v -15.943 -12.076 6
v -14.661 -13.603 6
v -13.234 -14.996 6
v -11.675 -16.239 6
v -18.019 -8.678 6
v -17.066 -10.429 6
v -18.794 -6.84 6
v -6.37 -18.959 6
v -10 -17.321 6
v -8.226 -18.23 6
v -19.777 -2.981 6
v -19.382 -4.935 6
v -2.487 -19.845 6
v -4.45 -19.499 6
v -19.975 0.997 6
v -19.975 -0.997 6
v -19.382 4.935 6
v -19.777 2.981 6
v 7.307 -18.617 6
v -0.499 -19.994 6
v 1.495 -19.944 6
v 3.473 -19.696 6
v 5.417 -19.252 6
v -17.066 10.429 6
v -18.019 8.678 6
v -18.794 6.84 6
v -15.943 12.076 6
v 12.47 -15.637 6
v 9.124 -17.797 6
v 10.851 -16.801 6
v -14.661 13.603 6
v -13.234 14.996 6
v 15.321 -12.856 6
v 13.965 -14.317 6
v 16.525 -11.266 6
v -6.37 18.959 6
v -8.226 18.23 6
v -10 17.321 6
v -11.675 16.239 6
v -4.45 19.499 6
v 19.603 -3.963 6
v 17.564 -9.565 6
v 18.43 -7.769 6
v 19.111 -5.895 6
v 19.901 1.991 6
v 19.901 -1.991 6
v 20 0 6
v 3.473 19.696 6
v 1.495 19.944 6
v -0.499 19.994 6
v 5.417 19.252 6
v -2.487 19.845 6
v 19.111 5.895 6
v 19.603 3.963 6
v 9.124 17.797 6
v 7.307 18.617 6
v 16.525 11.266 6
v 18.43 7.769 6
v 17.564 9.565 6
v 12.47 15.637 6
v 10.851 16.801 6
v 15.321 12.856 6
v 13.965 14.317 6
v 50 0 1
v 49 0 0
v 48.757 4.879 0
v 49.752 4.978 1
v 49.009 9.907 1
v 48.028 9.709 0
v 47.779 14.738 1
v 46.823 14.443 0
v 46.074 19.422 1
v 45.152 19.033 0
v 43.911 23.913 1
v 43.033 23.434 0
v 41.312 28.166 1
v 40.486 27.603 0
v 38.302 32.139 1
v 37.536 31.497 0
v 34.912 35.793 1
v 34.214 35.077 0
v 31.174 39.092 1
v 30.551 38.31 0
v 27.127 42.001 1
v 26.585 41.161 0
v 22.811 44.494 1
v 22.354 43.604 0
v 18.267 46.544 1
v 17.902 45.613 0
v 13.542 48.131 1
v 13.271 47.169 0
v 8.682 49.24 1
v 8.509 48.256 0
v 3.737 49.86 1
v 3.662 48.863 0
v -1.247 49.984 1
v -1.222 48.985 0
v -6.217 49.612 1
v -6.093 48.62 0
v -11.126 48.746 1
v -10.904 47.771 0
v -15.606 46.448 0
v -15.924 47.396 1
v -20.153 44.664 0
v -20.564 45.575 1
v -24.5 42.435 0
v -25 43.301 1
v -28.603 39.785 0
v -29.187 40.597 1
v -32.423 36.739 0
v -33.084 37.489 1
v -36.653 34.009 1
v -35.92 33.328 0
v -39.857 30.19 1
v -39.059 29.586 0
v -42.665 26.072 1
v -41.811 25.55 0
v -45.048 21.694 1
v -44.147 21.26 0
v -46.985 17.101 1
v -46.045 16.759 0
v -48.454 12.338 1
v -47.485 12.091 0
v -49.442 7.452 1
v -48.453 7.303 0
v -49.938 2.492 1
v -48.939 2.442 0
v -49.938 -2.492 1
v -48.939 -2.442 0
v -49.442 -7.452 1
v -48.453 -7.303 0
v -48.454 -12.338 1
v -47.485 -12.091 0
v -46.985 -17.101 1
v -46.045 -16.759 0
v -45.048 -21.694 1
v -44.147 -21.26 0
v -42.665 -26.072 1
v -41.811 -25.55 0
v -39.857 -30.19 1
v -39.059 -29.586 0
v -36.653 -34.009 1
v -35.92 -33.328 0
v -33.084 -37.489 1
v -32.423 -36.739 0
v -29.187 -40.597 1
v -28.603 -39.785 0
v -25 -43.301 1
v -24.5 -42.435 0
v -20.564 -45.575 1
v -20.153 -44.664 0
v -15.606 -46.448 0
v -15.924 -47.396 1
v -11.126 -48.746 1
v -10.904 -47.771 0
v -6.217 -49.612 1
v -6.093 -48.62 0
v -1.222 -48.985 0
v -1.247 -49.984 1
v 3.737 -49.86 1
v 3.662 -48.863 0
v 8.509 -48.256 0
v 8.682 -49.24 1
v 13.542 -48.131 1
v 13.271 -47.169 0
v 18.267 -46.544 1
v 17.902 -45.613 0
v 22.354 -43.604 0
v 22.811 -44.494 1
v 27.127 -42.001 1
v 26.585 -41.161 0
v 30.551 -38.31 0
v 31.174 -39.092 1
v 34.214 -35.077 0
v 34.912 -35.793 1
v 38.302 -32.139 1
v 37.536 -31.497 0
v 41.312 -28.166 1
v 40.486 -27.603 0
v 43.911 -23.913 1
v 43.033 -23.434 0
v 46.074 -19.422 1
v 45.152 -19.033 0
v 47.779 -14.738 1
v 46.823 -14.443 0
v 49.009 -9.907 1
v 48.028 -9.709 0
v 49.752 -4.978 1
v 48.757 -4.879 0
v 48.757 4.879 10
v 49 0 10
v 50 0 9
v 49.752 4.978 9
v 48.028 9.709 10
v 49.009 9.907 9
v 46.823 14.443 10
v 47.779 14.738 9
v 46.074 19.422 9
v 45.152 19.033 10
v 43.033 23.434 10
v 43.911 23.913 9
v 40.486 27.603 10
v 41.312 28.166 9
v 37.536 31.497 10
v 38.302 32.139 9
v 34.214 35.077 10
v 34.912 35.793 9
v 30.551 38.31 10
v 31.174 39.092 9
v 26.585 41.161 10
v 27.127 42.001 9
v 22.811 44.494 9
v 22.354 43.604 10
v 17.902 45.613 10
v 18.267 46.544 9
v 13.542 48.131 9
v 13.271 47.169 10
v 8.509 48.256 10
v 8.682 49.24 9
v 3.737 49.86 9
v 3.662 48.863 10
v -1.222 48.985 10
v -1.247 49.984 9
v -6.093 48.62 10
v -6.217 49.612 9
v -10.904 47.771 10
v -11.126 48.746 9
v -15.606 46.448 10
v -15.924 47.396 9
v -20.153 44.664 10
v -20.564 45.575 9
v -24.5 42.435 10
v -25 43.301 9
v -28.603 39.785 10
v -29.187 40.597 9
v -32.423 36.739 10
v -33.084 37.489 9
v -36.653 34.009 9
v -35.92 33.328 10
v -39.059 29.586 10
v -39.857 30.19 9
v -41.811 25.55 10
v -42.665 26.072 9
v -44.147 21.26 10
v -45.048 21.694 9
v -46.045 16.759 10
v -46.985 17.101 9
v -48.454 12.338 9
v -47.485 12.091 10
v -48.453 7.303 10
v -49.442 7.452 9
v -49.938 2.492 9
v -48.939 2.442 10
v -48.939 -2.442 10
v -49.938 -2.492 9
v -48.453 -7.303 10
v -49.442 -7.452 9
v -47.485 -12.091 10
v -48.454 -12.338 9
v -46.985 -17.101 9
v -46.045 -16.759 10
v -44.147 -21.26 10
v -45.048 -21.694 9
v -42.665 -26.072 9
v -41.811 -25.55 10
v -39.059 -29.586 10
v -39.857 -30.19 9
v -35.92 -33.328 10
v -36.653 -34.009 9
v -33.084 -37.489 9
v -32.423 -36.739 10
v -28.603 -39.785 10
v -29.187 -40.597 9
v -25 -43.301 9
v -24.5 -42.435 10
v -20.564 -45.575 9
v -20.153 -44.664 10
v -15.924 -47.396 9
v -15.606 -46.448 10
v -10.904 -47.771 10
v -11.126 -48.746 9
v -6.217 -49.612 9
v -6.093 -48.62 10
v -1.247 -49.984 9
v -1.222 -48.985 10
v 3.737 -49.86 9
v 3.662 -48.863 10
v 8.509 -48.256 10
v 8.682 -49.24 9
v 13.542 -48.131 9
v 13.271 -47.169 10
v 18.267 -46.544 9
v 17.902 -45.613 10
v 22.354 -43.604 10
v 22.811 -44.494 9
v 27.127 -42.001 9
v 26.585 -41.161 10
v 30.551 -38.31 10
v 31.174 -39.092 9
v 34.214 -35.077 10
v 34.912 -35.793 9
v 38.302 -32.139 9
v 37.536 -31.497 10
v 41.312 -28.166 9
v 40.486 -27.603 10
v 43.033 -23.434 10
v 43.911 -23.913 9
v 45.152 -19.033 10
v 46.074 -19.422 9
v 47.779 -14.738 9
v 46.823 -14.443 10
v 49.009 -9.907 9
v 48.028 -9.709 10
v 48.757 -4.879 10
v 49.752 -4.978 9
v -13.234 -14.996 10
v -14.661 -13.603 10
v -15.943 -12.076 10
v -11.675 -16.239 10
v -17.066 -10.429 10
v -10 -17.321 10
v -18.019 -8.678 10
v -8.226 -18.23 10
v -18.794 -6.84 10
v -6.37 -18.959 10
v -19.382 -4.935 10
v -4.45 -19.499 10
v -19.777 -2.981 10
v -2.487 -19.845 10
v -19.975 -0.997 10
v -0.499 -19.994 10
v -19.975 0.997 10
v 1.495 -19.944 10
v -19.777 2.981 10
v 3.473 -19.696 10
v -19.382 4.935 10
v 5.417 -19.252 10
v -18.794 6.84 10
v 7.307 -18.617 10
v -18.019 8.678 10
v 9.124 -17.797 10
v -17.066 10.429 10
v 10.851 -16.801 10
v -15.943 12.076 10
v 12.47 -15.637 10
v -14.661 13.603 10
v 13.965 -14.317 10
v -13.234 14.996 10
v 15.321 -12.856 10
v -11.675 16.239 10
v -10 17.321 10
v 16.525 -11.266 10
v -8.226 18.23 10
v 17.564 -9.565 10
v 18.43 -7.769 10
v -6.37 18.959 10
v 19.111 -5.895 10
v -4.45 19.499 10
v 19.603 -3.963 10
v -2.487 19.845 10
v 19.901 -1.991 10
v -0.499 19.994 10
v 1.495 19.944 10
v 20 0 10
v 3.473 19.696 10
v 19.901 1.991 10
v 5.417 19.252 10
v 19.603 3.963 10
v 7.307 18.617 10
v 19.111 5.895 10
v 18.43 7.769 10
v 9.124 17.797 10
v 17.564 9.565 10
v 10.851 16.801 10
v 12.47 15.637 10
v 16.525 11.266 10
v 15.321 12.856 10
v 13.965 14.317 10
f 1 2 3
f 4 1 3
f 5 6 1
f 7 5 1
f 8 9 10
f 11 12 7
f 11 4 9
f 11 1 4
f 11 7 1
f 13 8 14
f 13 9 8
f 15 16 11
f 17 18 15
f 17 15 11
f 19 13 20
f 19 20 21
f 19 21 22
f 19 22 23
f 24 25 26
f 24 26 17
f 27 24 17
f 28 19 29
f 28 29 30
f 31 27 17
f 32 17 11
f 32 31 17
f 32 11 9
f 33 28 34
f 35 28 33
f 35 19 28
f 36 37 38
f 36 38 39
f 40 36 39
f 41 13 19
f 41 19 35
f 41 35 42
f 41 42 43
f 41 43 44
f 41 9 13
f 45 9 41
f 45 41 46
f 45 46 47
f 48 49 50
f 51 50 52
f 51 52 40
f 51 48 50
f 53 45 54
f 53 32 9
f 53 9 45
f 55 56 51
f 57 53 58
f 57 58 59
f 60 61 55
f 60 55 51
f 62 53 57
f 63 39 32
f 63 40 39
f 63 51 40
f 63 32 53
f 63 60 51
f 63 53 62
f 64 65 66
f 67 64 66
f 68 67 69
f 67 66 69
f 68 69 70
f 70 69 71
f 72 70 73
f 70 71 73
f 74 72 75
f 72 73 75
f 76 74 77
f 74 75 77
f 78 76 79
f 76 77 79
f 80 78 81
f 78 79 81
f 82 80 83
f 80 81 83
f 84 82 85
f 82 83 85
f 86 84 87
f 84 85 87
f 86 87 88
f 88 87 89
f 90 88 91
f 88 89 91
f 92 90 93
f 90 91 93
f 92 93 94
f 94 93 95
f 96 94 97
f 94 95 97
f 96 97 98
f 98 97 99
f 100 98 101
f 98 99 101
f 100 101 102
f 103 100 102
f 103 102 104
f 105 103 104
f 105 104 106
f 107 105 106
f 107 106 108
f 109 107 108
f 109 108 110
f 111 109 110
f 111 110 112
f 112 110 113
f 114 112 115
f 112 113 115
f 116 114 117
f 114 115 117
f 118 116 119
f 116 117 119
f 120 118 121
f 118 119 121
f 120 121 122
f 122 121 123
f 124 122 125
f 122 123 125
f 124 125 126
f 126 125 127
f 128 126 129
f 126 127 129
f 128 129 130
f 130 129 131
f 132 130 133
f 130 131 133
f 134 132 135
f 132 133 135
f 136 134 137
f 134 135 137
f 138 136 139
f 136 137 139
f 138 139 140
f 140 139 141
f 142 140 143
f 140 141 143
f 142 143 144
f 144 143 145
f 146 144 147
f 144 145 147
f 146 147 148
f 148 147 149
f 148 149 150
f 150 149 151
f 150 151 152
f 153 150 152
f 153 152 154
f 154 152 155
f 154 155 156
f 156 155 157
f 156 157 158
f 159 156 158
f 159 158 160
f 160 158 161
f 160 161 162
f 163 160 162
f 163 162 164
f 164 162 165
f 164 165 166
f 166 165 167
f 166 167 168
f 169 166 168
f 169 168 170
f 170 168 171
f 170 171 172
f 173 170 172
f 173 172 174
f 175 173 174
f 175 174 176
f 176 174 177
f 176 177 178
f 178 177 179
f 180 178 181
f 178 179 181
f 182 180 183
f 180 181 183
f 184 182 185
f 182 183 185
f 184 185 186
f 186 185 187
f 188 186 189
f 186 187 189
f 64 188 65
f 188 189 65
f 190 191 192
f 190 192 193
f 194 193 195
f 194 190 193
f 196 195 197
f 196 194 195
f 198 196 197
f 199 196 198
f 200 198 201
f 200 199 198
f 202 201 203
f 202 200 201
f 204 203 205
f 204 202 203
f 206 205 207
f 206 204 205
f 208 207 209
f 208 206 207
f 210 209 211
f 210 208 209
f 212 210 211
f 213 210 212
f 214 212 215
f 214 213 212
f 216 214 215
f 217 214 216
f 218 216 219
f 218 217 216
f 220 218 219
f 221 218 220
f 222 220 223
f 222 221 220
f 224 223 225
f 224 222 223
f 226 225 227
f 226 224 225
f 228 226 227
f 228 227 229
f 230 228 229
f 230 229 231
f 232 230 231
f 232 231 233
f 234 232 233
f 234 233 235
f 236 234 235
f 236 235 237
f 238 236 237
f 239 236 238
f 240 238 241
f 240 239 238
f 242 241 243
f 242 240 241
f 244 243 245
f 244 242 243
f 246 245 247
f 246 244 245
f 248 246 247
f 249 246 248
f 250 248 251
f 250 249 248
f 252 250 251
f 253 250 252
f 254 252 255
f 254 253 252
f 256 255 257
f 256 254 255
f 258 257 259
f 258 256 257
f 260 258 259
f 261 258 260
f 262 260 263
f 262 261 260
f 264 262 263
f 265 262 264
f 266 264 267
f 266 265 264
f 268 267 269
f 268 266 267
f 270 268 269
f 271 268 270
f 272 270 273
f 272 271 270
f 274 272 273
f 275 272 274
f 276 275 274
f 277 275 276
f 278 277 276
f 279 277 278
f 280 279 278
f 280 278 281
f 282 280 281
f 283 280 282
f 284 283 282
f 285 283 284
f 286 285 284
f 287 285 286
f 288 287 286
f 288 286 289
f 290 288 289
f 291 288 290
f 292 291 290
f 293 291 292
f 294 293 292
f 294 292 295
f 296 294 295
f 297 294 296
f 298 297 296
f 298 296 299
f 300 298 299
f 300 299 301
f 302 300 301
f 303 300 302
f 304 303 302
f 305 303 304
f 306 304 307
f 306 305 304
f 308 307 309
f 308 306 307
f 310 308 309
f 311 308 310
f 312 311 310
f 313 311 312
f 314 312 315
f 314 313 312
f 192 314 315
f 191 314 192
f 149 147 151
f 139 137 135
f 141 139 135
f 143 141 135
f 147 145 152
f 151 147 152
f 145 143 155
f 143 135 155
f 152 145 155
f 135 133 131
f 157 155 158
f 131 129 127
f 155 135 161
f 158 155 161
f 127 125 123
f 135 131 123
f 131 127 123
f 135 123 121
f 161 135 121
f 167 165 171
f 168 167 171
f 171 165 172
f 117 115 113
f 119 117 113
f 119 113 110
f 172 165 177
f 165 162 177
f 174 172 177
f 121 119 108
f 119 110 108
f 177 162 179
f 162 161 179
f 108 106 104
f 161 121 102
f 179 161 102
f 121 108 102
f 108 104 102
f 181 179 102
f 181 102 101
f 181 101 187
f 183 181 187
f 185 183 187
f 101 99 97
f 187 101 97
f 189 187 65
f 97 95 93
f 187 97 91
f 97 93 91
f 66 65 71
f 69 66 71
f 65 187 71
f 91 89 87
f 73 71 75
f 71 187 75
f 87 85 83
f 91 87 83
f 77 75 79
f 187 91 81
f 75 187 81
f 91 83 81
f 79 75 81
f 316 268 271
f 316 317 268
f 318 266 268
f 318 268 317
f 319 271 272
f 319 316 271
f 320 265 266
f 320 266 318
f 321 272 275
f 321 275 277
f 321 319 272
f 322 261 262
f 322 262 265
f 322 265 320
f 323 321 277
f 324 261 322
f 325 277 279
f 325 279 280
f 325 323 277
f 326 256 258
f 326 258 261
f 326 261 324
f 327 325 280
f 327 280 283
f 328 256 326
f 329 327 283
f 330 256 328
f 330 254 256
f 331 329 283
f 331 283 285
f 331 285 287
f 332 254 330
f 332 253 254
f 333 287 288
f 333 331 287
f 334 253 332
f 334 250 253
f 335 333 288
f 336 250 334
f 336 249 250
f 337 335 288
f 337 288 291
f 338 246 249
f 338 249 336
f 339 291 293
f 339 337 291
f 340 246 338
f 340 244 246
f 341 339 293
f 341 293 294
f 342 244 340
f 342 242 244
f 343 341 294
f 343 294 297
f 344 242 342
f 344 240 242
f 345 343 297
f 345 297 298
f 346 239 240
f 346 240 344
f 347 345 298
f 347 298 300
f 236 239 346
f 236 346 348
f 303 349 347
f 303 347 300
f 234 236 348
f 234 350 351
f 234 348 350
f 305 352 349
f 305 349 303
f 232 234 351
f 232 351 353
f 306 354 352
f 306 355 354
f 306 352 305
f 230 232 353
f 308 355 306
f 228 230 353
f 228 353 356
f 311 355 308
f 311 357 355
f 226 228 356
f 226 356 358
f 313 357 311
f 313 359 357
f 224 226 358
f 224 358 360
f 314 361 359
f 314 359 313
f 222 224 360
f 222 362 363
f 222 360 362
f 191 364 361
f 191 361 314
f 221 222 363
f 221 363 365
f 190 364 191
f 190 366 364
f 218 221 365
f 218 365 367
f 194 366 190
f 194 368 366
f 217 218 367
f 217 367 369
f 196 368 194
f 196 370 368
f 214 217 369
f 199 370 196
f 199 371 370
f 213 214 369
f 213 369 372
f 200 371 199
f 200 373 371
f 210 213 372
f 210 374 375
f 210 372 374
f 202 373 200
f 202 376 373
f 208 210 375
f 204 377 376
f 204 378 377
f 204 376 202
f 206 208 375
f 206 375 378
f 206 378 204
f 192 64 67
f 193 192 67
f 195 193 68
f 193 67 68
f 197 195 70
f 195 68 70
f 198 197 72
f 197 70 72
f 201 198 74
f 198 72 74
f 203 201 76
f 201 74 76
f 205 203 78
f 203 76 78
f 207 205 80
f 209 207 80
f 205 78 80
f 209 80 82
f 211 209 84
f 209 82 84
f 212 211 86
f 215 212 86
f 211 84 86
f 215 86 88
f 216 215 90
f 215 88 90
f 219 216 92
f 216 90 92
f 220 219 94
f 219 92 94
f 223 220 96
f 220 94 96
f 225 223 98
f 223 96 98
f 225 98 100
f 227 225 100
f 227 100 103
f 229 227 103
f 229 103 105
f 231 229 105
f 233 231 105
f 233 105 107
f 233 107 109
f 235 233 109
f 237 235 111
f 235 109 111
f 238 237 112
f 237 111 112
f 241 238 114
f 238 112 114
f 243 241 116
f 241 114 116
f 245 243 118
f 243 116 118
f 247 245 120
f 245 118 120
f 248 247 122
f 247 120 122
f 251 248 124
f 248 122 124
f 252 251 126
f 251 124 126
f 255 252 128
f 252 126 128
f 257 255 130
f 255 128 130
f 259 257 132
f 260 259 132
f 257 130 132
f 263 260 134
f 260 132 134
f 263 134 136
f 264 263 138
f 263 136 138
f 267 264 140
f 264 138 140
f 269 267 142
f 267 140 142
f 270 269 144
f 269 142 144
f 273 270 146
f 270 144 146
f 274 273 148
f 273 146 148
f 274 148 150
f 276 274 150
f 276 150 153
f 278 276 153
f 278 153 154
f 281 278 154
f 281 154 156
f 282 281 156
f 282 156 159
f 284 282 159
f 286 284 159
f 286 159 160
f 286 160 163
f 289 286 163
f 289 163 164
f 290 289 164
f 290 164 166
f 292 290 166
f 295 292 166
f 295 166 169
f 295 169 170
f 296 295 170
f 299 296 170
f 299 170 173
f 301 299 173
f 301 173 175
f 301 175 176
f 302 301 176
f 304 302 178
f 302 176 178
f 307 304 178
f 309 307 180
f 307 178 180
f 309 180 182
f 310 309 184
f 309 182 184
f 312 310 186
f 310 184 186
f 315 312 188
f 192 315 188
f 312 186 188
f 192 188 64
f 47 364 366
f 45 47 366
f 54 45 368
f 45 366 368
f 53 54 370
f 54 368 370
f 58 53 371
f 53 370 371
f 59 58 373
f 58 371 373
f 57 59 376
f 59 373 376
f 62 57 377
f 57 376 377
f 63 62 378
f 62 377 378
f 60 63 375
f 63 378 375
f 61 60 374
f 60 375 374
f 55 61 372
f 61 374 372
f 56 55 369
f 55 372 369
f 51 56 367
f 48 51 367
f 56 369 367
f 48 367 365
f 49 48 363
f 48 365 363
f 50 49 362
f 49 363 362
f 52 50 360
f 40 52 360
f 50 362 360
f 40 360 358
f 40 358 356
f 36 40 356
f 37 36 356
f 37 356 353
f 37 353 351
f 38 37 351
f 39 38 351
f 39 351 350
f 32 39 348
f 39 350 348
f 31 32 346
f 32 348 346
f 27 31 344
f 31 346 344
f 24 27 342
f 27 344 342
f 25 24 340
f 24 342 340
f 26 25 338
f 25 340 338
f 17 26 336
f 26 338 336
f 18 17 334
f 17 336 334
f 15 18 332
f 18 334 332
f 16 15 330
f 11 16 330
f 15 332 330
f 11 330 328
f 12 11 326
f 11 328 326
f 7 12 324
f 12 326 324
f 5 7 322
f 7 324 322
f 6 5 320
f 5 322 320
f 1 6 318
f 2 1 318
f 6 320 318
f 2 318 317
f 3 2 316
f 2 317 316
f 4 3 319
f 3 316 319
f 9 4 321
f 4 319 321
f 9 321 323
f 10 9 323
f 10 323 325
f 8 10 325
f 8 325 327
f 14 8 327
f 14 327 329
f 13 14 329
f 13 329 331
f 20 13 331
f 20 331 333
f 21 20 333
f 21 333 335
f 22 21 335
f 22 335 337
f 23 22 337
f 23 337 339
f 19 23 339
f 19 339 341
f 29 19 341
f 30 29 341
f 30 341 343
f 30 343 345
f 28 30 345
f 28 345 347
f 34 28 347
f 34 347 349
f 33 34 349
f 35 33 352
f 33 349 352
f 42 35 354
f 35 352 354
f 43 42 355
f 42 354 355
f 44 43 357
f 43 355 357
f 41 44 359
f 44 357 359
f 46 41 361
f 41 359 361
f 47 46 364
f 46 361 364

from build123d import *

# Parameters (mm, degrees)
F0_R     = 50
F1_DEPTH = 10
F2_R     = 20
F3_DEPTH = 4
F4_SIZE  = 1


with BuildPart() as f1:
    # F0 (on Top) → F1 (new body)
    with BuildSketch(Plane.XY):
        Circle(F0_R)
    extrude(amount=F1_DEPTH)

    # F2 (on face) → F3 (cut)
    with BuildSketch(Plane.XY.offset(10)):
        Circle(F2_R)
    extrude(amount=-F3_DEPTH, mode=Mode.SUBTRACT)

    # F4
    f4_edges = [f1.edges().sort_by_distance(p)[0] for p in [
        (-50, 0, 10),
        (-50, 0, 0),
    ]]
    chamfer(f4_edges, length=F4_SIZE)


solid = f1.part
